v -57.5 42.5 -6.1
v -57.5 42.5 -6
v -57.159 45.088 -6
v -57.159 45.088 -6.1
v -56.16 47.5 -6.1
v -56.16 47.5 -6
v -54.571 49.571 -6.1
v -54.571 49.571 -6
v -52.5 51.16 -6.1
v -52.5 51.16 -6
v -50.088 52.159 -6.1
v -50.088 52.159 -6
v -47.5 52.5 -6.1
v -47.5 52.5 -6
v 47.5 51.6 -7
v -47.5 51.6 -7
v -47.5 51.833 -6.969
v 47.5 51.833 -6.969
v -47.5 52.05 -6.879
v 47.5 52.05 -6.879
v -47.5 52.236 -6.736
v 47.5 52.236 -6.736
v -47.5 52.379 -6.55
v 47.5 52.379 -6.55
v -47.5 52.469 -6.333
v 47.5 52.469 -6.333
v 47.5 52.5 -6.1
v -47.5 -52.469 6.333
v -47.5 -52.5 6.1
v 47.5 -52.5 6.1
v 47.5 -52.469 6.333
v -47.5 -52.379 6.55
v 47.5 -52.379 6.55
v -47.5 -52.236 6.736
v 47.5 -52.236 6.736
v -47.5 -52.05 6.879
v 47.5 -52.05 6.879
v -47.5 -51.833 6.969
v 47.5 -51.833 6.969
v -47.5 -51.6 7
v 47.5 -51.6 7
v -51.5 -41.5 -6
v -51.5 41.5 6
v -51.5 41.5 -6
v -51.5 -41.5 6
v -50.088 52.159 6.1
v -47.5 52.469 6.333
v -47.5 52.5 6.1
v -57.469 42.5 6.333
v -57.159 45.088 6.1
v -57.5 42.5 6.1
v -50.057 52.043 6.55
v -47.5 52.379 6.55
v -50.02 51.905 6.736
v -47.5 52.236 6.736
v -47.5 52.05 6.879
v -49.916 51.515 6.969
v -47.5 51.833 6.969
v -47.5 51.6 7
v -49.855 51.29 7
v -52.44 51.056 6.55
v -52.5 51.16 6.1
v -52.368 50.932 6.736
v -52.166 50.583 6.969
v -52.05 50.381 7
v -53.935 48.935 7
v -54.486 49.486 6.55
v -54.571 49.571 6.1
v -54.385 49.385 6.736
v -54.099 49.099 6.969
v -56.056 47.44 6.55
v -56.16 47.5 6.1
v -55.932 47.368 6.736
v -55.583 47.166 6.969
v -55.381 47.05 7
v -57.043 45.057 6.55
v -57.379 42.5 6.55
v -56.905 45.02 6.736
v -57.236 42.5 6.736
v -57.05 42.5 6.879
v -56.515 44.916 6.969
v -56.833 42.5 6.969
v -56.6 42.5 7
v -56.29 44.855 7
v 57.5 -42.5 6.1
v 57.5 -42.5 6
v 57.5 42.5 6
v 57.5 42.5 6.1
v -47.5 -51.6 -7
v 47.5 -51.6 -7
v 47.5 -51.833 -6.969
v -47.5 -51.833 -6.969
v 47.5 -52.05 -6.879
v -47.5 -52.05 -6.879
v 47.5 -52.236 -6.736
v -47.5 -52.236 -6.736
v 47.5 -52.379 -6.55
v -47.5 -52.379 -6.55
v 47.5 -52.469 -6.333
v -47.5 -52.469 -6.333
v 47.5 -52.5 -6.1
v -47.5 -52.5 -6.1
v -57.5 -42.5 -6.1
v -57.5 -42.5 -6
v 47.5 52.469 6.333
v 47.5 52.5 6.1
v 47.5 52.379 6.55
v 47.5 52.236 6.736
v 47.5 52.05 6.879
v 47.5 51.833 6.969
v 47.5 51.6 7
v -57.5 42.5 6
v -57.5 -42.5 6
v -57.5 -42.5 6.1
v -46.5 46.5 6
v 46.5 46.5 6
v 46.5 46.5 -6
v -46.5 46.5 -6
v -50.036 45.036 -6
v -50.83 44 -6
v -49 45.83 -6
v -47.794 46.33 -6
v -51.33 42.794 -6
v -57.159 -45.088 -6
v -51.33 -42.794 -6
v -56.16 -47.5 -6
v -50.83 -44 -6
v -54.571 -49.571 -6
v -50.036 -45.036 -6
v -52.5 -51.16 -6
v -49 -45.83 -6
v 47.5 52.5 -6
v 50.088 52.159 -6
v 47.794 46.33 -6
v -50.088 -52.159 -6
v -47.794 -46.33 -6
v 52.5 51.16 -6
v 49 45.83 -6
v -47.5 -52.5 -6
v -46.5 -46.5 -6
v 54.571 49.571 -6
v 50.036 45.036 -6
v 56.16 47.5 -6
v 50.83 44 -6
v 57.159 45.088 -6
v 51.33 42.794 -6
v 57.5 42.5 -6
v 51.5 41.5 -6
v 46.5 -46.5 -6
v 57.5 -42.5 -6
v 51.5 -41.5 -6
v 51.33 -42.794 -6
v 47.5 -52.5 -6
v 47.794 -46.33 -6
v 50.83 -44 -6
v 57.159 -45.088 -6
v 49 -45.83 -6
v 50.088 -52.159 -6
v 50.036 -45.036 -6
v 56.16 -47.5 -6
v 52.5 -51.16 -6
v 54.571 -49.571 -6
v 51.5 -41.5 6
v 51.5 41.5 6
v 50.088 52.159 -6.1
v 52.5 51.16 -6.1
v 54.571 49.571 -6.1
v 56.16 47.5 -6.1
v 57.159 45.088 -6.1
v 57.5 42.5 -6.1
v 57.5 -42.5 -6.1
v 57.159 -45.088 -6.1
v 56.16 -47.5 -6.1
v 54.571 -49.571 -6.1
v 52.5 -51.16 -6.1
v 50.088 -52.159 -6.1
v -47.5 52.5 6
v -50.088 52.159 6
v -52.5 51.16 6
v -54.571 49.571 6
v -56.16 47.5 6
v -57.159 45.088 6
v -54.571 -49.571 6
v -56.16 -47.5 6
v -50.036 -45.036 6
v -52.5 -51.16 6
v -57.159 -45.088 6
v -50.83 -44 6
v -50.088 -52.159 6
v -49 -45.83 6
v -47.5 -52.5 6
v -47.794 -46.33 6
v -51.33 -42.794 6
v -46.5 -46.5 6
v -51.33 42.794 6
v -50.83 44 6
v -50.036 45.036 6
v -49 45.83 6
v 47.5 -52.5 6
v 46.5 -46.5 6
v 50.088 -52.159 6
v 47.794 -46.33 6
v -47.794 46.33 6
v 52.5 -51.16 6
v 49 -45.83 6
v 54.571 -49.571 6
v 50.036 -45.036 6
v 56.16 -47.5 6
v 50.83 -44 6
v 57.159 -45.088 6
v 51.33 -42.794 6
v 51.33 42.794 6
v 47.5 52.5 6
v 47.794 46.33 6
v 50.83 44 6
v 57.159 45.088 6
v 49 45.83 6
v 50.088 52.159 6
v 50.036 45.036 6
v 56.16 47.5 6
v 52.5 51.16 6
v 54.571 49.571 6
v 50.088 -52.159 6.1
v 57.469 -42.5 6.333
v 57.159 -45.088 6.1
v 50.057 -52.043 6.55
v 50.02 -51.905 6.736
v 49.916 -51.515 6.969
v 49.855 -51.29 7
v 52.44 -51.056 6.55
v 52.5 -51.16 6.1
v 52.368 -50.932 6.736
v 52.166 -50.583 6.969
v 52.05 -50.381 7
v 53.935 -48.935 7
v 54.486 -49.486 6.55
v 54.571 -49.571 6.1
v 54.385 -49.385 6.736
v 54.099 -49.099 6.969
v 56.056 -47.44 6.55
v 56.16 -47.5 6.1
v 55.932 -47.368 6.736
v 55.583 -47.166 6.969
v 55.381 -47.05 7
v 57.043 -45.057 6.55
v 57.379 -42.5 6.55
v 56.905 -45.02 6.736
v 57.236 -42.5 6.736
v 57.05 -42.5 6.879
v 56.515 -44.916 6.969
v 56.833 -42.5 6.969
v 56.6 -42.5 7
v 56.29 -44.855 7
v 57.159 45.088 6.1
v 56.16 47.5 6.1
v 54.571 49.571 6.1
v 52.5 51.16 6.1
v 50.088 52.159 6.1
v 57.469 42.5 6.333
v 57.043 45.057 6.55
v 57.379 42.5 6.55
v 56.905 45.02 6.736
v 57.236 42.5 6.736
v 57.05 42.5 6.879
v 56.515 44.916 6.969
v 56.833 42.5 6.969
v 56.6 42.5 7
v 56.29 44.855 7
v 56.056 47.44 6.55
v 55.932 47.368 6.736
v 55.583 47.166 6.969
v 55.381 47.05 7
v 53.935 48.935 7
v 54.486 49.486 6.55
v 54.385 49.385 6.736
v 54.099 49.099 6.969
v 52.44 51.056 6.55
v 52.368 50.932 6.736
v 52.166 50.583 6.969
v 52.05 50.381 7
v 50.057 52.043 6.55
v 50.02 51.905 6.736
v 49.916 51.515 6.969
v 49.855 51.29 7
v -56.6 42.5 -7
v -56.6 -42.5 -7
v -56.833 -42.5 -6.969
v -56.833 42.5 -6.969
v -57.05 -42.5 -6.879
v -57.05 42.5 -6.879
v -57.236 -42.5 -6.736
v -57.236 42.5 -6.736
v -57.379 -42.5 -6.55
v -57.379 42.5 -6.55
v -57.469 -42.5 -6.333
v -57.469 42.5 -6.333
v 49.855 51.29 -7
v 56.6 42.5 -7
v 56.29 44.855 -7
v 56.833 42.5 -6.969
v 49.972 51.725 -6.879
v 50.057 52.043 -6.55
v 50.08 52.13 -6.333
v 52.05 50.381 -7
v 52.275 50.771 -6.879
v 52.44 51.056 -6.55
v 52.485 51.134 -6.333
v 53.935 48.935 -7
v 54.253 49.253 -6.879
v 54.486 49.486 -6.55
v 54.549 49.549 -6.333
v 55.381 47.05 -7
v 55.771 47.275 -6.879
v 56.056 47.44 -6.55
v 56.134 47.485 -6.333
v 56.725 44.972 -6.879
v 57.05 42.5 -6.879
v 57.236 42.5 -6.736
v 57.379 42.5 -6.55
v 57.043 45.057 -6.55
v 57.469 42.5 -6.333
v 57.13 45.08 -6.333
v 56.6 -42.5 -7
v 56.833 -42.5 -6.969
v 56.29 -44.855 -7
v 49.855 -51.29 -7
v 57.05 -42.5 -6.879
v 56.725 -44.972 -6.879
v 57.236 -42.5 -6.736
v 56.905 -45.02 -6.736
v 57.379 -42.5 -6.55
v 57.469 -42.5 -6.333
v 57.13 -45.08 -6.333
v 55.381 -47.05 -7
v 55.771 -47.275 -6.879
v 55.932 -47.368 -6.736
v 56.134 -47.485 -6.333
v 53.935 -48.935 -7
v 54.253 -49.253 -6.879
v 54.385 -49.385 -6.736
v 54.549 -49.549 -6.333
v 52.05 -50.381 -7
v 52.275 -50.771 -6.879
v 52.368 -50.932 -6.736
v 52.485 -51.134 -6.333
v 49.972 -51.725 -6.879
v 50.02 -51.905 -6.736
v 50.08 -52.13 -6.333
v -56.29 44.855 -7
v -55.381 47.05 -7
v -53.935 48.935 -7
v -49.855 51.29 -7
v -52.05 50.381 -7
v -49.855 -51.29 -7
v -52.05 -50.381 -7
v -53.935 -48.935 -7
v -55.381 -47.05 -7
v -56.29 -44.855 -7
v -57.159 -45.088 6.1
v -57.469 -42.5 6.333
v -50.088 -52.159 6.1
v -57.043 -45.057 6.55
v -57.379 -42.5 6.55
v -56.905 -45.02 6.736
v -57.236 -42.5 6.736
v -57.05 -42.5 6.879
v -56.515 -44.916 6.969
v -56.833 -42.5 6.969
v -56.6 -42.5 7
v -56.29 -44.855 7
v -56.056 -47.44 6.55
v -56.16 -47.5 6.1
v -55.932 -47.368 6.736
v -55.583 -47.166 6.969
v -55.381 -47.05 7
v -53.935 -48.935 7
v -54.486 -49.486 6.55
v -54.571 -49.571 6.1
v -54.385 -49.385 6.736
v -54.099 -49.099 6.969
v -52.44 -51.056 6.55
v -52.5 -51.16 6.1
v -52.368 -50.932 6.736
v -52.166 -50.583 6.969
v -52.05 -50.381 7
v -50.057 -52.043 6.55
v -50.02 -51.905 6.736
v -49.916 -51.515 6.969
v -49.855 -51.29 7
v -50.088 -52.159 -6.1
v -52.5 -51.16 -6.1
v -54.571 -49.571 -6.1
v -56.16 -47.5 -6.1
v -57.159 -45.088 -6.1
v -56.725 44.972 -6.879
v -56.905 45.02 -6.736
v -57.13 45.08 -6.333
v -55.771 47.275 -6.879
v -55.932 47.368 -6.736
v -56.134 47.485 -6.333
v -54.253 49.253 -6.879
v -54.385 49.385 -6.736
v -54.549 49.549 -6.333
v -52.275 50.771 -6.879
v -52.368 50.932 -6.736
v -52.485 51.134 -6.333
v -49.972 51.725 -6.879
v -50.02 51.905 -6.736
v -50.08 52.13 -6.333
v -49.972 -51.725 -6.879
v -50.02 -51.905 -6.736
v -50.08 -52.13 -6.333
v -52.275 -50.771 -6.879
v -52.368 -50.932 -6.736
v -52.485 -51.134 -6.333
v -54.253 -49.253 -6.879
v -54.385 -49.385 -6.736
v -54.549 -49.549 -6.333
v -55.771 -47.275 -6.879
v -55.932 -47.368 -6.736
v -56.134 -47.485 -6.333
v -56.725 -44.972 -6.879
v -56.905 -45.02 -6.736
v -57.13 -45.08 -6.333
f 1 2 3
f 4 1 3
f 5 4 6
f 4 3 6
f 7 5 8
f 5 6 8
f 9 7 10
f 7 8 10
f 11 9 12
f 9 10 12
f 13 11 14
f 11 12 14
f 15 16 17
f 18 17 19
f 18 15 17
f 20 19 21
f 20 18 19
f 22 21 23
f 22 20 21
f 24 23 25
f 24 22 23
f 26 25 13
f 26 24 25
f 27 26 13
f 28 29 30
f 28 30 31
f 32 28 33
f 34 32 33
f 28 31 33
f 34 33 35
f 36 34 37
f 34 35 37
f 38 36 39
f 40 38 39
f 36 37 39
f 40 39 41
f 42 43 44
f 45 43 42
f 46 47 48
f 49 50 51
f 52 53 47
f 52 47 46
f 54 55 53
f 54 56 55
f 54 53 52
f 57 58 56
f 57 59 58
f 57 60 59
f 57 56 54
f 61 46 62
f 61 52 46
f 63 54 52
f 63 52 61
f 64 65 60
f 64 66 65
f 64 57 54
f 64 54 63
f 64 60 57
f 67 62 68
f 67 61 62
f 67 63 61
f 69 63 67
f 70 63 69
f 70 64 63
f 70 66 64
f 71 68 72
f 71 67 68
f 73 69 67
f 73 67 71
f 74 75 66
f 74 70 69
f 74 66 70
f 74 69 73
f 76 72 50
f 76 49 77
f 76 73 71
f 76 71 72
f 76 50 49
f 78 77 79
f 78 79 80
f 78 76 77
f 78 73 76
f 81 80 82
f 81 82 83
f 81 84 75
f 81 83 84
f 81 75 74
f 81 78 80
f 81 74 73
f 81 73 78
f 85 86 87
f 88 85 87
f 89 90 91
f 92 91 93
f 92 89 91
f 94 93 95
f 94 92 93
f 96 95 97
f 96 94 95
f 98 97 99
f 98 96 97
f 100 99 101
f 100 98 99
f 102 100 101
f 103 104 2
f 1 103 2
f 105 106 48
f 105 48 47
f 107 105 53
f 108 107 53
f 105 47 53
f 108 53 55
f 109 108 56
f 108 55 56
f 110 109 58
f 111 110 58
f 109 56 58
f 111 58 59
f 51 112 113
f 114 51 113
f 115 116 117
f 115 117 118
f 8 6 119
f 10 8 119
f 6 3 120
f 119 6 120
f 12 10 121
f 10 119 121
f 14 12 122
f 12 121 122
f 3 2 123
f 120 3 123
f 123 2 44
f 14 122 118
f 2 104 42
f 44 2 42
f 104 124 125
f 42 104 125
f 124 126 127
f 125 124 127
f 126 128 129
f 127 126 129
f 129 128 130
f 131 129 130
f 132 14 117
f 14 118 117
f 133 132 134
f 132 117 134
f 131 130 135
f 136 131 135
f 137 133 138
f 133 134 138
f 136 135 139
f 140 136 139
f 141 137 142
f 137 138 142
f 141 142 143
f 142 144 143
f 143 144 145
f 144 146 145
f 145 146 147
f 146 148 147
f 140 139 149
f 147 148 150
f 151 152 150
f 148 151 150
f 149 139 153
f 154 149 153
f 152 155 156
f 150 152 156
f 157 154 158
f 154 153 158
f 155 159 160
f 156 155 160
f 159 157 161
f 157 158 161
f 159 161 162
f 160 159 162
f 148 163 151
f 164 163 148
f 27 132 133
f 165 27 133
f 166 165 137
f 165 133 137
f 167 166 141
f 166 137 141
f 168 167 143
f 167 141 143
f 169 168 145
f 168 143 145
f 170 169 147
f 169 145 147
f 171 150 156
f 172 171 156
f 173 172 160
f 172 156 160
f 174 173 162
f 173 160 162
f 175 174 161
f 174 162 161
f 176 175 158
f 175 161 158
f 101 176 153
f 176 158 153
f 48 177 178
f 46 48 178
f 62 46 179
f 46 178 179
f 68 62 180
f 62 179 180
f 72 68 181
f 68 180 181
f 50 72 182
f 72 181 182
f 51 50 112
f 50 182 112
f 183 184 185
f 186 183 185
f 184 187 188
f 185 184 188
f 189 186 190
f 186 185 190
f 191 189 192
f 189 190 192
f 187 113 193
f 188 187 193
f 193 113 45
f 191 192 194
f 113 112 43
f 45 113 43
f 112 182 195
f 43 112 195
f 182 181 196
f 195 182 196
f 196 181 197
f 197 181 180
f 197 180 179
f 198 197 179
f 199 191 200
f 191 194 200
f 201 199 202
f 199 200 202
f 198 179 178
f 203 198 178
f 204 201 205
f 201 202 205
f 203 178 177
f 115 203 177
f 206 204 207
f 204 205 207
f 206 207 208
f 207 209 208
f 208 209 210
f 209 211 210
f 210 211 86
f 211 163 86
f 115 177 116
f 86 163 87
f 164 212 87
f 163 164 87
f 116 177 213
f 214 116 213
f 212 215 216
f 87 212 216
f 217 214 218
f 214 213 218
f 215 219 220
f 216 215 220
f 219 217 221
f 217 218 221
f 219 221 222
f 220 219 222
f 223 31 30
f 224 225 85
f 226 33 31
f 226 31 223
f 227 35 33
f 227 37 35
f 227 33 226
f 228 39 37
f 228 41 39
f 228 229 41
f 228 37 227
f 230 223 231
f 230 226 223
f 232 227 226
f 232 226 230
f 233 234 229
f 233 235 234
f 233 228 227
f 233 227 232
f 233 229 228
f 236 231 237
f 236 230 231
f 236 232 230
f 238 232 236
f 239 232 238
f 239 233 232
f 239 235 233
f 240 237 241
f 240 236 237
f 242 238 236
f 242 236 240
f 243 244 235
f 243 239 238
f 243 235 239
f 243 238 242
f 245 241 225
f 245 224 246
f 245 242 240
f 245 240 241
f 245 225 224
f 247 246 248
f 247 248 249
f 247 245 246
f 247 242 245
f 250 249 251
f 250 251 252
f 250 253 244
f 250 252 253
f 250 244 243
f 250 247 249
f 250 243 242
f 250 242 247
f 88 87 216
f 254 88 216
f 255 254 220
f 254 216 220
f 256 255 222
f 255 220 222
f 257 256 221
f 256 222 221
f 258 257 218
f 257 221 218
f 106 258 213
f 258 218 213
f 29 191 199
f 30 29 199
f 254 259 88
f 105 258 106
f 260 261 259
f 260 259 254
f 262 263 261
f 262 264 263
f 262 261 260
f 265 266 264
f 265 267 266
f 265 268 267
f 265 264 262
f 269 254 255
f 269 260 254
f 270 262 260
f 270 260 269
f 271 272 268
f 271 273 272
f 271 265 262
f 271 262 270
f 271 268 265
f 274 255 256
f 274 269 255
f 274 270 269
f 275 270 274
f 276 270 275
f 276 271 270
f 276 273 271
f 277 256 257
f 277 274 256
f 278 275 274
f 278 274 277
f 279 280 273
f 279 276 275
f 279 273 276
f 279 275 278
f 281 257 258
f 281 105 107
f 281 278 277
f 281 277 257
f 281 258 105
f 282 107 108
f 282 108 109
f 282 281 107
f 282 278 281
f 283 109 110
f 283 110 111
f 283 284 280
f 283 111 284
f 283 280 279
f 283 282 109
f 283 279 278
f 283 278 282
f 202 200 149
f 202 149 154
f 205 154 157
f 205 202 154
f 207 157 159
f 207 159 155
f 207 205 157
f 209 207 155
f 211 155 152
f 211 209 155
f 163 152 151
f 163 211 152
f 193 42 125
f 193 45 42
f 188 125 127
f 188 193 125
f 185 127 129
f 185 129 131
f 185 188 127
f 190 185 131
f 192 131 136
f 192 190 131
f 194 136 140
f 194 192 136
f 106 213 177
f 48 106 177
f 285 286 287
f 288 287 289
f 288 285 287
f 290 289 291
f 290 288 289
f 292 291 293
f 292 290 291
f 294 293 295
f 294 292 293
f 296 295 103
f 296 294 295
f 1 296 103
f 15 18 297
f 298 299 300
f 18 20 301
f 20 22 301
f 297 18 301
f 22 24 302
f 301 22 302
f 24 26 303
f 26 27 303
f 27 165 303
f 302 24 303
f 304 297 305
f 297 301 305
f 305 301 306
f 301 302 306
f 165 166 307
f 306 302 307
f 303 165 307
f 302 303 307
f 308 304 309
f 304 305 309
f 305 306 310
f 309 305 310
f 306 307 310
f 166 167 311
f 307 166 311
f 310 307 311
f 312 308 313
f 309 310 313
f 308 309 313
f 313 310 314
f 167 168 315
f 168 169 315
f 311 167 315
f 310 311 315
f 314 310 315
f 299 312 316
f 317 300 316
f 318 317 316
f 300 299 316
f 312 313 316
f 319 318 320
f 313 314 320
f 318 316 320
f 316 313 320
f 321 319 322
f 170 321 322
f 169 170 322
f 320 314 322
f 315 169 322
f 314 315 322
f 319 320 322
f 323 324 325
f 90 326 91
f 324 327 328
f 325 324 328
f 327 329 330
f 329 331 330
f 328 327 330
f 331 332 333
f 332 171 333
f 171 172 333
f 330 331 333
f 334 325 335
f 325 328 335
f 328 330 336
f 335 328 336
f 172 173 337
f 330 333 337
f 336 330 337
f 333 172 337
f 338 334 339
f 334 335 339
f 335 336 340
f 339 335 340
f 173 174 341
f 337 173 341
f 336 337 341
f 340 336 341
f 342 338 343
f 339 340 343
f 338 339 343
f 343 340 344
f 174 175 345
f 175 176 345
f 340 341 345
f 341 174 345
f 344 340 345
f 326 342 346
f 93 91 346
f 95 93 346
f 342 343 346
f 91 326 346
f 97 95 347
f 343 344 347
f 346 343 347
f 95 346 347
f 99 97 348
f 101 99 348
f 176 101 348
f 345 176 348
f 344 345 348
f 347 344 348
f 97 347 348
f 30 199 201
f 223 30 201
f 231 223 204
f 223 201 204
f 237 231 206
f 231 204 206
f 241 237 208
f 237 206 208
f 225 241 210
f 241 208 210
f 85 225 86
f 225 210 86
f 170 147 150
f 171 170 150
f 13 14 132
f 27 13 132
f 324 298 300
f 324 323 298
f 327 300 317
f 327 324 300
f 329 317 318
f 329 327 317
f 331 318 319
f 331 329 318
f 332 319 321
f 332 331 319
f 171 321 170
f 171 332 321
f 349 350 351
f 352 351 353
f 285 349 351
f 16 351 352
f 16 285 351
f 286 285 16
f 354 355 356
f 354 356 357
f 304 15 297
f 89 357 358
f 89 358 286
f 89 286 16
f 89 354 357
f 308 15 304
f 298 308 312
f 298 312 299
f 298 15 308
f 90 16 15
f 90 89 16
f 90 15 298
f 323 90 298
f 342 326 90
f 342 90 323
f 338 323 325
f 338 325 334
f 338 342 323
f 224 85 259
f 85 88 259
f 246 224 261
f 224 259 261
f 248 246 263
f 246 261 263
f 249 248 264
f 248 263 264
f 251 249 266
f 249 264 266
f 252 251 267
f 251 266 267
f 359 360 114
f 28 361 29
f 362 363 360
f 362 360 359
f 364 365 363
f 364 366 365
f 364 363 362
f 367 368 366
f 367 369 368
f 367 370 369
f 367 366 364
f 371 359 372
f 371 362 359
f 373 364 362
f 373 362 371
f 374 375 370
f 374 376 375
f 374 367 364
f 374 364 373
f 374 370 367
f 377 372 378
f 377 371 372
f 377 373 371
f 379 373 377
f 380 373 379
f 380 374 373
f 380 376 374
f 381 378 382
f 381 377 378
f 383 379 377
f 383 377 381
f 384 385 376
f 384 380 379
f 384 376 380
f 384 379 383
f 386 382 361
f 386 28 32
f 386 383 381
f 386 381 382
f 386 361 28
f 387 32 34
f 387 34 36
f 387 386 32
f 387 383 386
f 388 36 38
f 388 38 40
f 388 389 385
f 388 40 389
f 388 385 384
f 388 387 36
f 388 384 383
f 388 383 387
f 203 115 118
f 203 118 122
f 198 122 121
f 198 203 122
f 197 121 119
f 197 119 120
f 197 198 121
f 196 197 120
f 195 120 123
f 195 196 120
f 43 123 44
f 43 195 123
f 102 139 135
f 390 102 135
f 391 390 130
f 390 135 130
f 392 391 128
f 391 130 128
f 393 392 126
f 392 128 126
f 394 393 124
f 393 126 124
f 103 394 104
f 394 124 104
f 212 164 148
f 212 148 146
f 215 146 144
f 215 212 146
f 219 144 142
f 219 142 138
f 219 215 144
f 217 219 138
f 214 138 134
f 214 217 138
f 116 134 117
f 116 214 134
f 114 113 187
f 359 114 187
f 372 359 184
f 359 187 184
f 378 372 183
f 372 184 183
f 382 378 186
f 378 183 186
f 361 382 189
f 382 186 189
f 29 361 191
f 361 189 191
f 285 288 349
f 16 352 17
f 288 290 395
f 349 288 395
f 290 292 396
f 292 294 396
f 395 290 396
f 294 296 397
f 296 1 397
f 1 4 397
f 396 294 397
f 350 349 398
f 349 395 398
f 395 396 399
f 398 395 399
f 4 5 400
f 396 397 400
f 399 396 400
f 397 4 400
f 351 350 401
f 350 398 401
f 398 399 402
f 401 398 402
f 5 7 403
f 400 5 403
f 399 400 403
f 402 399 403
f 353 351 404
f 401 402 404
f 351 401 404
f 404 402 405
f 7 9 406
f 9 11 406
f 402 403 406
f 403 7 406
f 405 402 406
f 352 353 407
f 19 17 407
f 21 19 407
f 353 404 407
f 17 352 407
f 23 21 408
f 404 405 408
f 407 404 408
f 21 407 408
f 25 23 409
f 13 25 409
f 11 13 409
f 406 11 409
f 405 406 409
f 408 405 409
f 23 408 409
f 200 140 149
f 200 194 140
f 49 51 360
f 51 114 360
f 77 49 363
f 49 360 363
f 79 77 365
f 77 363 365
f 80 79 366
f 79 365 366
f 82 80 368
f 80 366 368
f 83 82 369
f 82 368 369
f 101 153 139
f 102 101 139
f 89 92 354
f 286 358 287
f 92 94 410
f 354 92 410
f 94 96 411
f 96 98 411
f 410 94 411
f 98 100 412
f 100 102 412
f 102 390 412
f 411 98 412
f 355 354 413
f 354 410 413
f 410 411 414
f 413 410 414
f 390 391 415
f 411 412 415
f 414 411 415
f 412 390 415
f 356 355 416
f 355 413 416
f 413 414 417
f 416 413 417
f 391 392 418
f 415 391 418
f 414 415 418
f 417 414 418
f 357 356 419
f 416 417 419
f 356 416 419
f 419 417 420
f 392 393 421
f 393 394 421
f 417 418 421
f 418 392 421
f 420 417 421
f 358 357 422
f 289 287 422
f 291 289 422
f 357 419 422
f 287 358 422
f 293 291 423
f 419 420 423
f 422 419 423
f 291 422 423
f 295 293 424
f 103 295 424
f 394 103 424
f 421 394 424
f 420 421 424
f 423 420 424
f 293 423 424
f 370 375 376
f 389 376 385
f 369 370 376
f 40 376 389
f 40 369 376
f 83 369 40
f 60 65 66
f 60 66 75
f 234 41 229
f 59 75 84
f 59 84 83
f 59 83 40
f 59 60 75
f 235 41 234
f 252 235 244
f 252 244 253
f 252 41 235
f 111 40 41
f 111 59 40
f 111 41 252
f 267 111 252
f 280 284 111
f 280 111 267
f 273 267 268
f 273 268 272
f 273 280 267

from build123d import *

# Parameters (mm, degrees)
PAD_DEPTH    = 6
PAD001_DEPTH = 1
PAD002_DEPTH = 1
FILLET_R     = 0.9


with BuildPart() as part:
    # Sketch → Pad (new body, symmetric)
    with BuildSketch(Plane.XY):
        with BuildLine():
            Line((-46.5, -46.5), (46.5, -46.5))
            ThreePointArc((46.5, -46.5), (50.035534, -45.035534), (51.5, -41.5))
            Line((51.5, -41.5), (51.5, 41.5))
            ThreePointArc((51.5, 41.5), (50.035534, 45.035534), (46.5, 46.5))
            Line((46.5, 46.5), (-46.5, 46.5))
            ThreePointArc((-46.5, 46.5), (-50.035534, 45.035534), (-51.5, 41.5))
            Line((-51.5, 41.5), (-51.5, -41.5))
            ThreePointArc((-51.5, -41.5), (-50.035534, -45.035534), (-46.5, -46.5))
        make_face()
    extrude(amount=PAD_DEPTH, both=True)

    # Sketch001 (on Face10 of Pad) → Pad001 (join)
    with BuildSketch(Plane.XY.offset(6)):
        with BuildLine():
            Line((-47.5, -52.5), (47.5, -52.5))
            ThreePointArc((47.5, -52.5), (54.571068, -49.571068), (57.5, -42.5))
            Line((57.5, -42.5), (57.5, 42.5))
            ThreePointArc((57.5, 42.5), (54.571068, 49.571068), (47.5, 52.5))
            Line((47.5, 52.5), (-47.5, 52.5))
            ThreePointArc((-47.5, 52.5), (-54.571068, 49.571068), (-57.5, 42.5))
            Line((-57.5, 42.5), (-57.5, -42.5))
            ThreePointArc((-57.5, -42.5), (-54.571068, -49.571068), (-47.5, -52.5))
        make_face()
    extrude(amount=PAD001_DEPTH)

    # Sketch002 (on Face4 of Pad001) → Pad002 (join)
    with BuildSketch(Plane(origin=(0, 0, -6), x_dir=(1, 0, 0), z_dir=(0, 0, -1))):
        with BuildLine():
            Line((-47.5, -52.5), (47.5, -52.5))
            ThreePointArc((47.5, -52.5), (54.571068, -49.571068), (57.5, -42.5))
            Line((57.5, -42.5), (57.5, 42.5))
            ThreePointArc((57.5, 42.5), (54.571068, 49.571068), (47.5, 52.5))
            Line((47.5, 52.5), (-47.5, 52.5))
            ThreePointArc((-47.5, 52.5), (-54.571068, 49.571068), (-57.5, 42.5))
            Line((-57.5, 42.5), (-57.5, -42.5))
            ThreePointArc((-57.5, -42.5), (-54.571068, -49.571068), (-47.5, -52.5))
        make_face()
    extrude(amount=PAD002_DEPTH)

    # Fillet
    fillet_edges = [part.edges().sort_by_distance(p)[0] for p in [
        (57.5, 0, -7),
        (57.5, 0, 7),
    ]]
    fillet(fillet_edges, radius=FILLET_R)


solid = part.part
